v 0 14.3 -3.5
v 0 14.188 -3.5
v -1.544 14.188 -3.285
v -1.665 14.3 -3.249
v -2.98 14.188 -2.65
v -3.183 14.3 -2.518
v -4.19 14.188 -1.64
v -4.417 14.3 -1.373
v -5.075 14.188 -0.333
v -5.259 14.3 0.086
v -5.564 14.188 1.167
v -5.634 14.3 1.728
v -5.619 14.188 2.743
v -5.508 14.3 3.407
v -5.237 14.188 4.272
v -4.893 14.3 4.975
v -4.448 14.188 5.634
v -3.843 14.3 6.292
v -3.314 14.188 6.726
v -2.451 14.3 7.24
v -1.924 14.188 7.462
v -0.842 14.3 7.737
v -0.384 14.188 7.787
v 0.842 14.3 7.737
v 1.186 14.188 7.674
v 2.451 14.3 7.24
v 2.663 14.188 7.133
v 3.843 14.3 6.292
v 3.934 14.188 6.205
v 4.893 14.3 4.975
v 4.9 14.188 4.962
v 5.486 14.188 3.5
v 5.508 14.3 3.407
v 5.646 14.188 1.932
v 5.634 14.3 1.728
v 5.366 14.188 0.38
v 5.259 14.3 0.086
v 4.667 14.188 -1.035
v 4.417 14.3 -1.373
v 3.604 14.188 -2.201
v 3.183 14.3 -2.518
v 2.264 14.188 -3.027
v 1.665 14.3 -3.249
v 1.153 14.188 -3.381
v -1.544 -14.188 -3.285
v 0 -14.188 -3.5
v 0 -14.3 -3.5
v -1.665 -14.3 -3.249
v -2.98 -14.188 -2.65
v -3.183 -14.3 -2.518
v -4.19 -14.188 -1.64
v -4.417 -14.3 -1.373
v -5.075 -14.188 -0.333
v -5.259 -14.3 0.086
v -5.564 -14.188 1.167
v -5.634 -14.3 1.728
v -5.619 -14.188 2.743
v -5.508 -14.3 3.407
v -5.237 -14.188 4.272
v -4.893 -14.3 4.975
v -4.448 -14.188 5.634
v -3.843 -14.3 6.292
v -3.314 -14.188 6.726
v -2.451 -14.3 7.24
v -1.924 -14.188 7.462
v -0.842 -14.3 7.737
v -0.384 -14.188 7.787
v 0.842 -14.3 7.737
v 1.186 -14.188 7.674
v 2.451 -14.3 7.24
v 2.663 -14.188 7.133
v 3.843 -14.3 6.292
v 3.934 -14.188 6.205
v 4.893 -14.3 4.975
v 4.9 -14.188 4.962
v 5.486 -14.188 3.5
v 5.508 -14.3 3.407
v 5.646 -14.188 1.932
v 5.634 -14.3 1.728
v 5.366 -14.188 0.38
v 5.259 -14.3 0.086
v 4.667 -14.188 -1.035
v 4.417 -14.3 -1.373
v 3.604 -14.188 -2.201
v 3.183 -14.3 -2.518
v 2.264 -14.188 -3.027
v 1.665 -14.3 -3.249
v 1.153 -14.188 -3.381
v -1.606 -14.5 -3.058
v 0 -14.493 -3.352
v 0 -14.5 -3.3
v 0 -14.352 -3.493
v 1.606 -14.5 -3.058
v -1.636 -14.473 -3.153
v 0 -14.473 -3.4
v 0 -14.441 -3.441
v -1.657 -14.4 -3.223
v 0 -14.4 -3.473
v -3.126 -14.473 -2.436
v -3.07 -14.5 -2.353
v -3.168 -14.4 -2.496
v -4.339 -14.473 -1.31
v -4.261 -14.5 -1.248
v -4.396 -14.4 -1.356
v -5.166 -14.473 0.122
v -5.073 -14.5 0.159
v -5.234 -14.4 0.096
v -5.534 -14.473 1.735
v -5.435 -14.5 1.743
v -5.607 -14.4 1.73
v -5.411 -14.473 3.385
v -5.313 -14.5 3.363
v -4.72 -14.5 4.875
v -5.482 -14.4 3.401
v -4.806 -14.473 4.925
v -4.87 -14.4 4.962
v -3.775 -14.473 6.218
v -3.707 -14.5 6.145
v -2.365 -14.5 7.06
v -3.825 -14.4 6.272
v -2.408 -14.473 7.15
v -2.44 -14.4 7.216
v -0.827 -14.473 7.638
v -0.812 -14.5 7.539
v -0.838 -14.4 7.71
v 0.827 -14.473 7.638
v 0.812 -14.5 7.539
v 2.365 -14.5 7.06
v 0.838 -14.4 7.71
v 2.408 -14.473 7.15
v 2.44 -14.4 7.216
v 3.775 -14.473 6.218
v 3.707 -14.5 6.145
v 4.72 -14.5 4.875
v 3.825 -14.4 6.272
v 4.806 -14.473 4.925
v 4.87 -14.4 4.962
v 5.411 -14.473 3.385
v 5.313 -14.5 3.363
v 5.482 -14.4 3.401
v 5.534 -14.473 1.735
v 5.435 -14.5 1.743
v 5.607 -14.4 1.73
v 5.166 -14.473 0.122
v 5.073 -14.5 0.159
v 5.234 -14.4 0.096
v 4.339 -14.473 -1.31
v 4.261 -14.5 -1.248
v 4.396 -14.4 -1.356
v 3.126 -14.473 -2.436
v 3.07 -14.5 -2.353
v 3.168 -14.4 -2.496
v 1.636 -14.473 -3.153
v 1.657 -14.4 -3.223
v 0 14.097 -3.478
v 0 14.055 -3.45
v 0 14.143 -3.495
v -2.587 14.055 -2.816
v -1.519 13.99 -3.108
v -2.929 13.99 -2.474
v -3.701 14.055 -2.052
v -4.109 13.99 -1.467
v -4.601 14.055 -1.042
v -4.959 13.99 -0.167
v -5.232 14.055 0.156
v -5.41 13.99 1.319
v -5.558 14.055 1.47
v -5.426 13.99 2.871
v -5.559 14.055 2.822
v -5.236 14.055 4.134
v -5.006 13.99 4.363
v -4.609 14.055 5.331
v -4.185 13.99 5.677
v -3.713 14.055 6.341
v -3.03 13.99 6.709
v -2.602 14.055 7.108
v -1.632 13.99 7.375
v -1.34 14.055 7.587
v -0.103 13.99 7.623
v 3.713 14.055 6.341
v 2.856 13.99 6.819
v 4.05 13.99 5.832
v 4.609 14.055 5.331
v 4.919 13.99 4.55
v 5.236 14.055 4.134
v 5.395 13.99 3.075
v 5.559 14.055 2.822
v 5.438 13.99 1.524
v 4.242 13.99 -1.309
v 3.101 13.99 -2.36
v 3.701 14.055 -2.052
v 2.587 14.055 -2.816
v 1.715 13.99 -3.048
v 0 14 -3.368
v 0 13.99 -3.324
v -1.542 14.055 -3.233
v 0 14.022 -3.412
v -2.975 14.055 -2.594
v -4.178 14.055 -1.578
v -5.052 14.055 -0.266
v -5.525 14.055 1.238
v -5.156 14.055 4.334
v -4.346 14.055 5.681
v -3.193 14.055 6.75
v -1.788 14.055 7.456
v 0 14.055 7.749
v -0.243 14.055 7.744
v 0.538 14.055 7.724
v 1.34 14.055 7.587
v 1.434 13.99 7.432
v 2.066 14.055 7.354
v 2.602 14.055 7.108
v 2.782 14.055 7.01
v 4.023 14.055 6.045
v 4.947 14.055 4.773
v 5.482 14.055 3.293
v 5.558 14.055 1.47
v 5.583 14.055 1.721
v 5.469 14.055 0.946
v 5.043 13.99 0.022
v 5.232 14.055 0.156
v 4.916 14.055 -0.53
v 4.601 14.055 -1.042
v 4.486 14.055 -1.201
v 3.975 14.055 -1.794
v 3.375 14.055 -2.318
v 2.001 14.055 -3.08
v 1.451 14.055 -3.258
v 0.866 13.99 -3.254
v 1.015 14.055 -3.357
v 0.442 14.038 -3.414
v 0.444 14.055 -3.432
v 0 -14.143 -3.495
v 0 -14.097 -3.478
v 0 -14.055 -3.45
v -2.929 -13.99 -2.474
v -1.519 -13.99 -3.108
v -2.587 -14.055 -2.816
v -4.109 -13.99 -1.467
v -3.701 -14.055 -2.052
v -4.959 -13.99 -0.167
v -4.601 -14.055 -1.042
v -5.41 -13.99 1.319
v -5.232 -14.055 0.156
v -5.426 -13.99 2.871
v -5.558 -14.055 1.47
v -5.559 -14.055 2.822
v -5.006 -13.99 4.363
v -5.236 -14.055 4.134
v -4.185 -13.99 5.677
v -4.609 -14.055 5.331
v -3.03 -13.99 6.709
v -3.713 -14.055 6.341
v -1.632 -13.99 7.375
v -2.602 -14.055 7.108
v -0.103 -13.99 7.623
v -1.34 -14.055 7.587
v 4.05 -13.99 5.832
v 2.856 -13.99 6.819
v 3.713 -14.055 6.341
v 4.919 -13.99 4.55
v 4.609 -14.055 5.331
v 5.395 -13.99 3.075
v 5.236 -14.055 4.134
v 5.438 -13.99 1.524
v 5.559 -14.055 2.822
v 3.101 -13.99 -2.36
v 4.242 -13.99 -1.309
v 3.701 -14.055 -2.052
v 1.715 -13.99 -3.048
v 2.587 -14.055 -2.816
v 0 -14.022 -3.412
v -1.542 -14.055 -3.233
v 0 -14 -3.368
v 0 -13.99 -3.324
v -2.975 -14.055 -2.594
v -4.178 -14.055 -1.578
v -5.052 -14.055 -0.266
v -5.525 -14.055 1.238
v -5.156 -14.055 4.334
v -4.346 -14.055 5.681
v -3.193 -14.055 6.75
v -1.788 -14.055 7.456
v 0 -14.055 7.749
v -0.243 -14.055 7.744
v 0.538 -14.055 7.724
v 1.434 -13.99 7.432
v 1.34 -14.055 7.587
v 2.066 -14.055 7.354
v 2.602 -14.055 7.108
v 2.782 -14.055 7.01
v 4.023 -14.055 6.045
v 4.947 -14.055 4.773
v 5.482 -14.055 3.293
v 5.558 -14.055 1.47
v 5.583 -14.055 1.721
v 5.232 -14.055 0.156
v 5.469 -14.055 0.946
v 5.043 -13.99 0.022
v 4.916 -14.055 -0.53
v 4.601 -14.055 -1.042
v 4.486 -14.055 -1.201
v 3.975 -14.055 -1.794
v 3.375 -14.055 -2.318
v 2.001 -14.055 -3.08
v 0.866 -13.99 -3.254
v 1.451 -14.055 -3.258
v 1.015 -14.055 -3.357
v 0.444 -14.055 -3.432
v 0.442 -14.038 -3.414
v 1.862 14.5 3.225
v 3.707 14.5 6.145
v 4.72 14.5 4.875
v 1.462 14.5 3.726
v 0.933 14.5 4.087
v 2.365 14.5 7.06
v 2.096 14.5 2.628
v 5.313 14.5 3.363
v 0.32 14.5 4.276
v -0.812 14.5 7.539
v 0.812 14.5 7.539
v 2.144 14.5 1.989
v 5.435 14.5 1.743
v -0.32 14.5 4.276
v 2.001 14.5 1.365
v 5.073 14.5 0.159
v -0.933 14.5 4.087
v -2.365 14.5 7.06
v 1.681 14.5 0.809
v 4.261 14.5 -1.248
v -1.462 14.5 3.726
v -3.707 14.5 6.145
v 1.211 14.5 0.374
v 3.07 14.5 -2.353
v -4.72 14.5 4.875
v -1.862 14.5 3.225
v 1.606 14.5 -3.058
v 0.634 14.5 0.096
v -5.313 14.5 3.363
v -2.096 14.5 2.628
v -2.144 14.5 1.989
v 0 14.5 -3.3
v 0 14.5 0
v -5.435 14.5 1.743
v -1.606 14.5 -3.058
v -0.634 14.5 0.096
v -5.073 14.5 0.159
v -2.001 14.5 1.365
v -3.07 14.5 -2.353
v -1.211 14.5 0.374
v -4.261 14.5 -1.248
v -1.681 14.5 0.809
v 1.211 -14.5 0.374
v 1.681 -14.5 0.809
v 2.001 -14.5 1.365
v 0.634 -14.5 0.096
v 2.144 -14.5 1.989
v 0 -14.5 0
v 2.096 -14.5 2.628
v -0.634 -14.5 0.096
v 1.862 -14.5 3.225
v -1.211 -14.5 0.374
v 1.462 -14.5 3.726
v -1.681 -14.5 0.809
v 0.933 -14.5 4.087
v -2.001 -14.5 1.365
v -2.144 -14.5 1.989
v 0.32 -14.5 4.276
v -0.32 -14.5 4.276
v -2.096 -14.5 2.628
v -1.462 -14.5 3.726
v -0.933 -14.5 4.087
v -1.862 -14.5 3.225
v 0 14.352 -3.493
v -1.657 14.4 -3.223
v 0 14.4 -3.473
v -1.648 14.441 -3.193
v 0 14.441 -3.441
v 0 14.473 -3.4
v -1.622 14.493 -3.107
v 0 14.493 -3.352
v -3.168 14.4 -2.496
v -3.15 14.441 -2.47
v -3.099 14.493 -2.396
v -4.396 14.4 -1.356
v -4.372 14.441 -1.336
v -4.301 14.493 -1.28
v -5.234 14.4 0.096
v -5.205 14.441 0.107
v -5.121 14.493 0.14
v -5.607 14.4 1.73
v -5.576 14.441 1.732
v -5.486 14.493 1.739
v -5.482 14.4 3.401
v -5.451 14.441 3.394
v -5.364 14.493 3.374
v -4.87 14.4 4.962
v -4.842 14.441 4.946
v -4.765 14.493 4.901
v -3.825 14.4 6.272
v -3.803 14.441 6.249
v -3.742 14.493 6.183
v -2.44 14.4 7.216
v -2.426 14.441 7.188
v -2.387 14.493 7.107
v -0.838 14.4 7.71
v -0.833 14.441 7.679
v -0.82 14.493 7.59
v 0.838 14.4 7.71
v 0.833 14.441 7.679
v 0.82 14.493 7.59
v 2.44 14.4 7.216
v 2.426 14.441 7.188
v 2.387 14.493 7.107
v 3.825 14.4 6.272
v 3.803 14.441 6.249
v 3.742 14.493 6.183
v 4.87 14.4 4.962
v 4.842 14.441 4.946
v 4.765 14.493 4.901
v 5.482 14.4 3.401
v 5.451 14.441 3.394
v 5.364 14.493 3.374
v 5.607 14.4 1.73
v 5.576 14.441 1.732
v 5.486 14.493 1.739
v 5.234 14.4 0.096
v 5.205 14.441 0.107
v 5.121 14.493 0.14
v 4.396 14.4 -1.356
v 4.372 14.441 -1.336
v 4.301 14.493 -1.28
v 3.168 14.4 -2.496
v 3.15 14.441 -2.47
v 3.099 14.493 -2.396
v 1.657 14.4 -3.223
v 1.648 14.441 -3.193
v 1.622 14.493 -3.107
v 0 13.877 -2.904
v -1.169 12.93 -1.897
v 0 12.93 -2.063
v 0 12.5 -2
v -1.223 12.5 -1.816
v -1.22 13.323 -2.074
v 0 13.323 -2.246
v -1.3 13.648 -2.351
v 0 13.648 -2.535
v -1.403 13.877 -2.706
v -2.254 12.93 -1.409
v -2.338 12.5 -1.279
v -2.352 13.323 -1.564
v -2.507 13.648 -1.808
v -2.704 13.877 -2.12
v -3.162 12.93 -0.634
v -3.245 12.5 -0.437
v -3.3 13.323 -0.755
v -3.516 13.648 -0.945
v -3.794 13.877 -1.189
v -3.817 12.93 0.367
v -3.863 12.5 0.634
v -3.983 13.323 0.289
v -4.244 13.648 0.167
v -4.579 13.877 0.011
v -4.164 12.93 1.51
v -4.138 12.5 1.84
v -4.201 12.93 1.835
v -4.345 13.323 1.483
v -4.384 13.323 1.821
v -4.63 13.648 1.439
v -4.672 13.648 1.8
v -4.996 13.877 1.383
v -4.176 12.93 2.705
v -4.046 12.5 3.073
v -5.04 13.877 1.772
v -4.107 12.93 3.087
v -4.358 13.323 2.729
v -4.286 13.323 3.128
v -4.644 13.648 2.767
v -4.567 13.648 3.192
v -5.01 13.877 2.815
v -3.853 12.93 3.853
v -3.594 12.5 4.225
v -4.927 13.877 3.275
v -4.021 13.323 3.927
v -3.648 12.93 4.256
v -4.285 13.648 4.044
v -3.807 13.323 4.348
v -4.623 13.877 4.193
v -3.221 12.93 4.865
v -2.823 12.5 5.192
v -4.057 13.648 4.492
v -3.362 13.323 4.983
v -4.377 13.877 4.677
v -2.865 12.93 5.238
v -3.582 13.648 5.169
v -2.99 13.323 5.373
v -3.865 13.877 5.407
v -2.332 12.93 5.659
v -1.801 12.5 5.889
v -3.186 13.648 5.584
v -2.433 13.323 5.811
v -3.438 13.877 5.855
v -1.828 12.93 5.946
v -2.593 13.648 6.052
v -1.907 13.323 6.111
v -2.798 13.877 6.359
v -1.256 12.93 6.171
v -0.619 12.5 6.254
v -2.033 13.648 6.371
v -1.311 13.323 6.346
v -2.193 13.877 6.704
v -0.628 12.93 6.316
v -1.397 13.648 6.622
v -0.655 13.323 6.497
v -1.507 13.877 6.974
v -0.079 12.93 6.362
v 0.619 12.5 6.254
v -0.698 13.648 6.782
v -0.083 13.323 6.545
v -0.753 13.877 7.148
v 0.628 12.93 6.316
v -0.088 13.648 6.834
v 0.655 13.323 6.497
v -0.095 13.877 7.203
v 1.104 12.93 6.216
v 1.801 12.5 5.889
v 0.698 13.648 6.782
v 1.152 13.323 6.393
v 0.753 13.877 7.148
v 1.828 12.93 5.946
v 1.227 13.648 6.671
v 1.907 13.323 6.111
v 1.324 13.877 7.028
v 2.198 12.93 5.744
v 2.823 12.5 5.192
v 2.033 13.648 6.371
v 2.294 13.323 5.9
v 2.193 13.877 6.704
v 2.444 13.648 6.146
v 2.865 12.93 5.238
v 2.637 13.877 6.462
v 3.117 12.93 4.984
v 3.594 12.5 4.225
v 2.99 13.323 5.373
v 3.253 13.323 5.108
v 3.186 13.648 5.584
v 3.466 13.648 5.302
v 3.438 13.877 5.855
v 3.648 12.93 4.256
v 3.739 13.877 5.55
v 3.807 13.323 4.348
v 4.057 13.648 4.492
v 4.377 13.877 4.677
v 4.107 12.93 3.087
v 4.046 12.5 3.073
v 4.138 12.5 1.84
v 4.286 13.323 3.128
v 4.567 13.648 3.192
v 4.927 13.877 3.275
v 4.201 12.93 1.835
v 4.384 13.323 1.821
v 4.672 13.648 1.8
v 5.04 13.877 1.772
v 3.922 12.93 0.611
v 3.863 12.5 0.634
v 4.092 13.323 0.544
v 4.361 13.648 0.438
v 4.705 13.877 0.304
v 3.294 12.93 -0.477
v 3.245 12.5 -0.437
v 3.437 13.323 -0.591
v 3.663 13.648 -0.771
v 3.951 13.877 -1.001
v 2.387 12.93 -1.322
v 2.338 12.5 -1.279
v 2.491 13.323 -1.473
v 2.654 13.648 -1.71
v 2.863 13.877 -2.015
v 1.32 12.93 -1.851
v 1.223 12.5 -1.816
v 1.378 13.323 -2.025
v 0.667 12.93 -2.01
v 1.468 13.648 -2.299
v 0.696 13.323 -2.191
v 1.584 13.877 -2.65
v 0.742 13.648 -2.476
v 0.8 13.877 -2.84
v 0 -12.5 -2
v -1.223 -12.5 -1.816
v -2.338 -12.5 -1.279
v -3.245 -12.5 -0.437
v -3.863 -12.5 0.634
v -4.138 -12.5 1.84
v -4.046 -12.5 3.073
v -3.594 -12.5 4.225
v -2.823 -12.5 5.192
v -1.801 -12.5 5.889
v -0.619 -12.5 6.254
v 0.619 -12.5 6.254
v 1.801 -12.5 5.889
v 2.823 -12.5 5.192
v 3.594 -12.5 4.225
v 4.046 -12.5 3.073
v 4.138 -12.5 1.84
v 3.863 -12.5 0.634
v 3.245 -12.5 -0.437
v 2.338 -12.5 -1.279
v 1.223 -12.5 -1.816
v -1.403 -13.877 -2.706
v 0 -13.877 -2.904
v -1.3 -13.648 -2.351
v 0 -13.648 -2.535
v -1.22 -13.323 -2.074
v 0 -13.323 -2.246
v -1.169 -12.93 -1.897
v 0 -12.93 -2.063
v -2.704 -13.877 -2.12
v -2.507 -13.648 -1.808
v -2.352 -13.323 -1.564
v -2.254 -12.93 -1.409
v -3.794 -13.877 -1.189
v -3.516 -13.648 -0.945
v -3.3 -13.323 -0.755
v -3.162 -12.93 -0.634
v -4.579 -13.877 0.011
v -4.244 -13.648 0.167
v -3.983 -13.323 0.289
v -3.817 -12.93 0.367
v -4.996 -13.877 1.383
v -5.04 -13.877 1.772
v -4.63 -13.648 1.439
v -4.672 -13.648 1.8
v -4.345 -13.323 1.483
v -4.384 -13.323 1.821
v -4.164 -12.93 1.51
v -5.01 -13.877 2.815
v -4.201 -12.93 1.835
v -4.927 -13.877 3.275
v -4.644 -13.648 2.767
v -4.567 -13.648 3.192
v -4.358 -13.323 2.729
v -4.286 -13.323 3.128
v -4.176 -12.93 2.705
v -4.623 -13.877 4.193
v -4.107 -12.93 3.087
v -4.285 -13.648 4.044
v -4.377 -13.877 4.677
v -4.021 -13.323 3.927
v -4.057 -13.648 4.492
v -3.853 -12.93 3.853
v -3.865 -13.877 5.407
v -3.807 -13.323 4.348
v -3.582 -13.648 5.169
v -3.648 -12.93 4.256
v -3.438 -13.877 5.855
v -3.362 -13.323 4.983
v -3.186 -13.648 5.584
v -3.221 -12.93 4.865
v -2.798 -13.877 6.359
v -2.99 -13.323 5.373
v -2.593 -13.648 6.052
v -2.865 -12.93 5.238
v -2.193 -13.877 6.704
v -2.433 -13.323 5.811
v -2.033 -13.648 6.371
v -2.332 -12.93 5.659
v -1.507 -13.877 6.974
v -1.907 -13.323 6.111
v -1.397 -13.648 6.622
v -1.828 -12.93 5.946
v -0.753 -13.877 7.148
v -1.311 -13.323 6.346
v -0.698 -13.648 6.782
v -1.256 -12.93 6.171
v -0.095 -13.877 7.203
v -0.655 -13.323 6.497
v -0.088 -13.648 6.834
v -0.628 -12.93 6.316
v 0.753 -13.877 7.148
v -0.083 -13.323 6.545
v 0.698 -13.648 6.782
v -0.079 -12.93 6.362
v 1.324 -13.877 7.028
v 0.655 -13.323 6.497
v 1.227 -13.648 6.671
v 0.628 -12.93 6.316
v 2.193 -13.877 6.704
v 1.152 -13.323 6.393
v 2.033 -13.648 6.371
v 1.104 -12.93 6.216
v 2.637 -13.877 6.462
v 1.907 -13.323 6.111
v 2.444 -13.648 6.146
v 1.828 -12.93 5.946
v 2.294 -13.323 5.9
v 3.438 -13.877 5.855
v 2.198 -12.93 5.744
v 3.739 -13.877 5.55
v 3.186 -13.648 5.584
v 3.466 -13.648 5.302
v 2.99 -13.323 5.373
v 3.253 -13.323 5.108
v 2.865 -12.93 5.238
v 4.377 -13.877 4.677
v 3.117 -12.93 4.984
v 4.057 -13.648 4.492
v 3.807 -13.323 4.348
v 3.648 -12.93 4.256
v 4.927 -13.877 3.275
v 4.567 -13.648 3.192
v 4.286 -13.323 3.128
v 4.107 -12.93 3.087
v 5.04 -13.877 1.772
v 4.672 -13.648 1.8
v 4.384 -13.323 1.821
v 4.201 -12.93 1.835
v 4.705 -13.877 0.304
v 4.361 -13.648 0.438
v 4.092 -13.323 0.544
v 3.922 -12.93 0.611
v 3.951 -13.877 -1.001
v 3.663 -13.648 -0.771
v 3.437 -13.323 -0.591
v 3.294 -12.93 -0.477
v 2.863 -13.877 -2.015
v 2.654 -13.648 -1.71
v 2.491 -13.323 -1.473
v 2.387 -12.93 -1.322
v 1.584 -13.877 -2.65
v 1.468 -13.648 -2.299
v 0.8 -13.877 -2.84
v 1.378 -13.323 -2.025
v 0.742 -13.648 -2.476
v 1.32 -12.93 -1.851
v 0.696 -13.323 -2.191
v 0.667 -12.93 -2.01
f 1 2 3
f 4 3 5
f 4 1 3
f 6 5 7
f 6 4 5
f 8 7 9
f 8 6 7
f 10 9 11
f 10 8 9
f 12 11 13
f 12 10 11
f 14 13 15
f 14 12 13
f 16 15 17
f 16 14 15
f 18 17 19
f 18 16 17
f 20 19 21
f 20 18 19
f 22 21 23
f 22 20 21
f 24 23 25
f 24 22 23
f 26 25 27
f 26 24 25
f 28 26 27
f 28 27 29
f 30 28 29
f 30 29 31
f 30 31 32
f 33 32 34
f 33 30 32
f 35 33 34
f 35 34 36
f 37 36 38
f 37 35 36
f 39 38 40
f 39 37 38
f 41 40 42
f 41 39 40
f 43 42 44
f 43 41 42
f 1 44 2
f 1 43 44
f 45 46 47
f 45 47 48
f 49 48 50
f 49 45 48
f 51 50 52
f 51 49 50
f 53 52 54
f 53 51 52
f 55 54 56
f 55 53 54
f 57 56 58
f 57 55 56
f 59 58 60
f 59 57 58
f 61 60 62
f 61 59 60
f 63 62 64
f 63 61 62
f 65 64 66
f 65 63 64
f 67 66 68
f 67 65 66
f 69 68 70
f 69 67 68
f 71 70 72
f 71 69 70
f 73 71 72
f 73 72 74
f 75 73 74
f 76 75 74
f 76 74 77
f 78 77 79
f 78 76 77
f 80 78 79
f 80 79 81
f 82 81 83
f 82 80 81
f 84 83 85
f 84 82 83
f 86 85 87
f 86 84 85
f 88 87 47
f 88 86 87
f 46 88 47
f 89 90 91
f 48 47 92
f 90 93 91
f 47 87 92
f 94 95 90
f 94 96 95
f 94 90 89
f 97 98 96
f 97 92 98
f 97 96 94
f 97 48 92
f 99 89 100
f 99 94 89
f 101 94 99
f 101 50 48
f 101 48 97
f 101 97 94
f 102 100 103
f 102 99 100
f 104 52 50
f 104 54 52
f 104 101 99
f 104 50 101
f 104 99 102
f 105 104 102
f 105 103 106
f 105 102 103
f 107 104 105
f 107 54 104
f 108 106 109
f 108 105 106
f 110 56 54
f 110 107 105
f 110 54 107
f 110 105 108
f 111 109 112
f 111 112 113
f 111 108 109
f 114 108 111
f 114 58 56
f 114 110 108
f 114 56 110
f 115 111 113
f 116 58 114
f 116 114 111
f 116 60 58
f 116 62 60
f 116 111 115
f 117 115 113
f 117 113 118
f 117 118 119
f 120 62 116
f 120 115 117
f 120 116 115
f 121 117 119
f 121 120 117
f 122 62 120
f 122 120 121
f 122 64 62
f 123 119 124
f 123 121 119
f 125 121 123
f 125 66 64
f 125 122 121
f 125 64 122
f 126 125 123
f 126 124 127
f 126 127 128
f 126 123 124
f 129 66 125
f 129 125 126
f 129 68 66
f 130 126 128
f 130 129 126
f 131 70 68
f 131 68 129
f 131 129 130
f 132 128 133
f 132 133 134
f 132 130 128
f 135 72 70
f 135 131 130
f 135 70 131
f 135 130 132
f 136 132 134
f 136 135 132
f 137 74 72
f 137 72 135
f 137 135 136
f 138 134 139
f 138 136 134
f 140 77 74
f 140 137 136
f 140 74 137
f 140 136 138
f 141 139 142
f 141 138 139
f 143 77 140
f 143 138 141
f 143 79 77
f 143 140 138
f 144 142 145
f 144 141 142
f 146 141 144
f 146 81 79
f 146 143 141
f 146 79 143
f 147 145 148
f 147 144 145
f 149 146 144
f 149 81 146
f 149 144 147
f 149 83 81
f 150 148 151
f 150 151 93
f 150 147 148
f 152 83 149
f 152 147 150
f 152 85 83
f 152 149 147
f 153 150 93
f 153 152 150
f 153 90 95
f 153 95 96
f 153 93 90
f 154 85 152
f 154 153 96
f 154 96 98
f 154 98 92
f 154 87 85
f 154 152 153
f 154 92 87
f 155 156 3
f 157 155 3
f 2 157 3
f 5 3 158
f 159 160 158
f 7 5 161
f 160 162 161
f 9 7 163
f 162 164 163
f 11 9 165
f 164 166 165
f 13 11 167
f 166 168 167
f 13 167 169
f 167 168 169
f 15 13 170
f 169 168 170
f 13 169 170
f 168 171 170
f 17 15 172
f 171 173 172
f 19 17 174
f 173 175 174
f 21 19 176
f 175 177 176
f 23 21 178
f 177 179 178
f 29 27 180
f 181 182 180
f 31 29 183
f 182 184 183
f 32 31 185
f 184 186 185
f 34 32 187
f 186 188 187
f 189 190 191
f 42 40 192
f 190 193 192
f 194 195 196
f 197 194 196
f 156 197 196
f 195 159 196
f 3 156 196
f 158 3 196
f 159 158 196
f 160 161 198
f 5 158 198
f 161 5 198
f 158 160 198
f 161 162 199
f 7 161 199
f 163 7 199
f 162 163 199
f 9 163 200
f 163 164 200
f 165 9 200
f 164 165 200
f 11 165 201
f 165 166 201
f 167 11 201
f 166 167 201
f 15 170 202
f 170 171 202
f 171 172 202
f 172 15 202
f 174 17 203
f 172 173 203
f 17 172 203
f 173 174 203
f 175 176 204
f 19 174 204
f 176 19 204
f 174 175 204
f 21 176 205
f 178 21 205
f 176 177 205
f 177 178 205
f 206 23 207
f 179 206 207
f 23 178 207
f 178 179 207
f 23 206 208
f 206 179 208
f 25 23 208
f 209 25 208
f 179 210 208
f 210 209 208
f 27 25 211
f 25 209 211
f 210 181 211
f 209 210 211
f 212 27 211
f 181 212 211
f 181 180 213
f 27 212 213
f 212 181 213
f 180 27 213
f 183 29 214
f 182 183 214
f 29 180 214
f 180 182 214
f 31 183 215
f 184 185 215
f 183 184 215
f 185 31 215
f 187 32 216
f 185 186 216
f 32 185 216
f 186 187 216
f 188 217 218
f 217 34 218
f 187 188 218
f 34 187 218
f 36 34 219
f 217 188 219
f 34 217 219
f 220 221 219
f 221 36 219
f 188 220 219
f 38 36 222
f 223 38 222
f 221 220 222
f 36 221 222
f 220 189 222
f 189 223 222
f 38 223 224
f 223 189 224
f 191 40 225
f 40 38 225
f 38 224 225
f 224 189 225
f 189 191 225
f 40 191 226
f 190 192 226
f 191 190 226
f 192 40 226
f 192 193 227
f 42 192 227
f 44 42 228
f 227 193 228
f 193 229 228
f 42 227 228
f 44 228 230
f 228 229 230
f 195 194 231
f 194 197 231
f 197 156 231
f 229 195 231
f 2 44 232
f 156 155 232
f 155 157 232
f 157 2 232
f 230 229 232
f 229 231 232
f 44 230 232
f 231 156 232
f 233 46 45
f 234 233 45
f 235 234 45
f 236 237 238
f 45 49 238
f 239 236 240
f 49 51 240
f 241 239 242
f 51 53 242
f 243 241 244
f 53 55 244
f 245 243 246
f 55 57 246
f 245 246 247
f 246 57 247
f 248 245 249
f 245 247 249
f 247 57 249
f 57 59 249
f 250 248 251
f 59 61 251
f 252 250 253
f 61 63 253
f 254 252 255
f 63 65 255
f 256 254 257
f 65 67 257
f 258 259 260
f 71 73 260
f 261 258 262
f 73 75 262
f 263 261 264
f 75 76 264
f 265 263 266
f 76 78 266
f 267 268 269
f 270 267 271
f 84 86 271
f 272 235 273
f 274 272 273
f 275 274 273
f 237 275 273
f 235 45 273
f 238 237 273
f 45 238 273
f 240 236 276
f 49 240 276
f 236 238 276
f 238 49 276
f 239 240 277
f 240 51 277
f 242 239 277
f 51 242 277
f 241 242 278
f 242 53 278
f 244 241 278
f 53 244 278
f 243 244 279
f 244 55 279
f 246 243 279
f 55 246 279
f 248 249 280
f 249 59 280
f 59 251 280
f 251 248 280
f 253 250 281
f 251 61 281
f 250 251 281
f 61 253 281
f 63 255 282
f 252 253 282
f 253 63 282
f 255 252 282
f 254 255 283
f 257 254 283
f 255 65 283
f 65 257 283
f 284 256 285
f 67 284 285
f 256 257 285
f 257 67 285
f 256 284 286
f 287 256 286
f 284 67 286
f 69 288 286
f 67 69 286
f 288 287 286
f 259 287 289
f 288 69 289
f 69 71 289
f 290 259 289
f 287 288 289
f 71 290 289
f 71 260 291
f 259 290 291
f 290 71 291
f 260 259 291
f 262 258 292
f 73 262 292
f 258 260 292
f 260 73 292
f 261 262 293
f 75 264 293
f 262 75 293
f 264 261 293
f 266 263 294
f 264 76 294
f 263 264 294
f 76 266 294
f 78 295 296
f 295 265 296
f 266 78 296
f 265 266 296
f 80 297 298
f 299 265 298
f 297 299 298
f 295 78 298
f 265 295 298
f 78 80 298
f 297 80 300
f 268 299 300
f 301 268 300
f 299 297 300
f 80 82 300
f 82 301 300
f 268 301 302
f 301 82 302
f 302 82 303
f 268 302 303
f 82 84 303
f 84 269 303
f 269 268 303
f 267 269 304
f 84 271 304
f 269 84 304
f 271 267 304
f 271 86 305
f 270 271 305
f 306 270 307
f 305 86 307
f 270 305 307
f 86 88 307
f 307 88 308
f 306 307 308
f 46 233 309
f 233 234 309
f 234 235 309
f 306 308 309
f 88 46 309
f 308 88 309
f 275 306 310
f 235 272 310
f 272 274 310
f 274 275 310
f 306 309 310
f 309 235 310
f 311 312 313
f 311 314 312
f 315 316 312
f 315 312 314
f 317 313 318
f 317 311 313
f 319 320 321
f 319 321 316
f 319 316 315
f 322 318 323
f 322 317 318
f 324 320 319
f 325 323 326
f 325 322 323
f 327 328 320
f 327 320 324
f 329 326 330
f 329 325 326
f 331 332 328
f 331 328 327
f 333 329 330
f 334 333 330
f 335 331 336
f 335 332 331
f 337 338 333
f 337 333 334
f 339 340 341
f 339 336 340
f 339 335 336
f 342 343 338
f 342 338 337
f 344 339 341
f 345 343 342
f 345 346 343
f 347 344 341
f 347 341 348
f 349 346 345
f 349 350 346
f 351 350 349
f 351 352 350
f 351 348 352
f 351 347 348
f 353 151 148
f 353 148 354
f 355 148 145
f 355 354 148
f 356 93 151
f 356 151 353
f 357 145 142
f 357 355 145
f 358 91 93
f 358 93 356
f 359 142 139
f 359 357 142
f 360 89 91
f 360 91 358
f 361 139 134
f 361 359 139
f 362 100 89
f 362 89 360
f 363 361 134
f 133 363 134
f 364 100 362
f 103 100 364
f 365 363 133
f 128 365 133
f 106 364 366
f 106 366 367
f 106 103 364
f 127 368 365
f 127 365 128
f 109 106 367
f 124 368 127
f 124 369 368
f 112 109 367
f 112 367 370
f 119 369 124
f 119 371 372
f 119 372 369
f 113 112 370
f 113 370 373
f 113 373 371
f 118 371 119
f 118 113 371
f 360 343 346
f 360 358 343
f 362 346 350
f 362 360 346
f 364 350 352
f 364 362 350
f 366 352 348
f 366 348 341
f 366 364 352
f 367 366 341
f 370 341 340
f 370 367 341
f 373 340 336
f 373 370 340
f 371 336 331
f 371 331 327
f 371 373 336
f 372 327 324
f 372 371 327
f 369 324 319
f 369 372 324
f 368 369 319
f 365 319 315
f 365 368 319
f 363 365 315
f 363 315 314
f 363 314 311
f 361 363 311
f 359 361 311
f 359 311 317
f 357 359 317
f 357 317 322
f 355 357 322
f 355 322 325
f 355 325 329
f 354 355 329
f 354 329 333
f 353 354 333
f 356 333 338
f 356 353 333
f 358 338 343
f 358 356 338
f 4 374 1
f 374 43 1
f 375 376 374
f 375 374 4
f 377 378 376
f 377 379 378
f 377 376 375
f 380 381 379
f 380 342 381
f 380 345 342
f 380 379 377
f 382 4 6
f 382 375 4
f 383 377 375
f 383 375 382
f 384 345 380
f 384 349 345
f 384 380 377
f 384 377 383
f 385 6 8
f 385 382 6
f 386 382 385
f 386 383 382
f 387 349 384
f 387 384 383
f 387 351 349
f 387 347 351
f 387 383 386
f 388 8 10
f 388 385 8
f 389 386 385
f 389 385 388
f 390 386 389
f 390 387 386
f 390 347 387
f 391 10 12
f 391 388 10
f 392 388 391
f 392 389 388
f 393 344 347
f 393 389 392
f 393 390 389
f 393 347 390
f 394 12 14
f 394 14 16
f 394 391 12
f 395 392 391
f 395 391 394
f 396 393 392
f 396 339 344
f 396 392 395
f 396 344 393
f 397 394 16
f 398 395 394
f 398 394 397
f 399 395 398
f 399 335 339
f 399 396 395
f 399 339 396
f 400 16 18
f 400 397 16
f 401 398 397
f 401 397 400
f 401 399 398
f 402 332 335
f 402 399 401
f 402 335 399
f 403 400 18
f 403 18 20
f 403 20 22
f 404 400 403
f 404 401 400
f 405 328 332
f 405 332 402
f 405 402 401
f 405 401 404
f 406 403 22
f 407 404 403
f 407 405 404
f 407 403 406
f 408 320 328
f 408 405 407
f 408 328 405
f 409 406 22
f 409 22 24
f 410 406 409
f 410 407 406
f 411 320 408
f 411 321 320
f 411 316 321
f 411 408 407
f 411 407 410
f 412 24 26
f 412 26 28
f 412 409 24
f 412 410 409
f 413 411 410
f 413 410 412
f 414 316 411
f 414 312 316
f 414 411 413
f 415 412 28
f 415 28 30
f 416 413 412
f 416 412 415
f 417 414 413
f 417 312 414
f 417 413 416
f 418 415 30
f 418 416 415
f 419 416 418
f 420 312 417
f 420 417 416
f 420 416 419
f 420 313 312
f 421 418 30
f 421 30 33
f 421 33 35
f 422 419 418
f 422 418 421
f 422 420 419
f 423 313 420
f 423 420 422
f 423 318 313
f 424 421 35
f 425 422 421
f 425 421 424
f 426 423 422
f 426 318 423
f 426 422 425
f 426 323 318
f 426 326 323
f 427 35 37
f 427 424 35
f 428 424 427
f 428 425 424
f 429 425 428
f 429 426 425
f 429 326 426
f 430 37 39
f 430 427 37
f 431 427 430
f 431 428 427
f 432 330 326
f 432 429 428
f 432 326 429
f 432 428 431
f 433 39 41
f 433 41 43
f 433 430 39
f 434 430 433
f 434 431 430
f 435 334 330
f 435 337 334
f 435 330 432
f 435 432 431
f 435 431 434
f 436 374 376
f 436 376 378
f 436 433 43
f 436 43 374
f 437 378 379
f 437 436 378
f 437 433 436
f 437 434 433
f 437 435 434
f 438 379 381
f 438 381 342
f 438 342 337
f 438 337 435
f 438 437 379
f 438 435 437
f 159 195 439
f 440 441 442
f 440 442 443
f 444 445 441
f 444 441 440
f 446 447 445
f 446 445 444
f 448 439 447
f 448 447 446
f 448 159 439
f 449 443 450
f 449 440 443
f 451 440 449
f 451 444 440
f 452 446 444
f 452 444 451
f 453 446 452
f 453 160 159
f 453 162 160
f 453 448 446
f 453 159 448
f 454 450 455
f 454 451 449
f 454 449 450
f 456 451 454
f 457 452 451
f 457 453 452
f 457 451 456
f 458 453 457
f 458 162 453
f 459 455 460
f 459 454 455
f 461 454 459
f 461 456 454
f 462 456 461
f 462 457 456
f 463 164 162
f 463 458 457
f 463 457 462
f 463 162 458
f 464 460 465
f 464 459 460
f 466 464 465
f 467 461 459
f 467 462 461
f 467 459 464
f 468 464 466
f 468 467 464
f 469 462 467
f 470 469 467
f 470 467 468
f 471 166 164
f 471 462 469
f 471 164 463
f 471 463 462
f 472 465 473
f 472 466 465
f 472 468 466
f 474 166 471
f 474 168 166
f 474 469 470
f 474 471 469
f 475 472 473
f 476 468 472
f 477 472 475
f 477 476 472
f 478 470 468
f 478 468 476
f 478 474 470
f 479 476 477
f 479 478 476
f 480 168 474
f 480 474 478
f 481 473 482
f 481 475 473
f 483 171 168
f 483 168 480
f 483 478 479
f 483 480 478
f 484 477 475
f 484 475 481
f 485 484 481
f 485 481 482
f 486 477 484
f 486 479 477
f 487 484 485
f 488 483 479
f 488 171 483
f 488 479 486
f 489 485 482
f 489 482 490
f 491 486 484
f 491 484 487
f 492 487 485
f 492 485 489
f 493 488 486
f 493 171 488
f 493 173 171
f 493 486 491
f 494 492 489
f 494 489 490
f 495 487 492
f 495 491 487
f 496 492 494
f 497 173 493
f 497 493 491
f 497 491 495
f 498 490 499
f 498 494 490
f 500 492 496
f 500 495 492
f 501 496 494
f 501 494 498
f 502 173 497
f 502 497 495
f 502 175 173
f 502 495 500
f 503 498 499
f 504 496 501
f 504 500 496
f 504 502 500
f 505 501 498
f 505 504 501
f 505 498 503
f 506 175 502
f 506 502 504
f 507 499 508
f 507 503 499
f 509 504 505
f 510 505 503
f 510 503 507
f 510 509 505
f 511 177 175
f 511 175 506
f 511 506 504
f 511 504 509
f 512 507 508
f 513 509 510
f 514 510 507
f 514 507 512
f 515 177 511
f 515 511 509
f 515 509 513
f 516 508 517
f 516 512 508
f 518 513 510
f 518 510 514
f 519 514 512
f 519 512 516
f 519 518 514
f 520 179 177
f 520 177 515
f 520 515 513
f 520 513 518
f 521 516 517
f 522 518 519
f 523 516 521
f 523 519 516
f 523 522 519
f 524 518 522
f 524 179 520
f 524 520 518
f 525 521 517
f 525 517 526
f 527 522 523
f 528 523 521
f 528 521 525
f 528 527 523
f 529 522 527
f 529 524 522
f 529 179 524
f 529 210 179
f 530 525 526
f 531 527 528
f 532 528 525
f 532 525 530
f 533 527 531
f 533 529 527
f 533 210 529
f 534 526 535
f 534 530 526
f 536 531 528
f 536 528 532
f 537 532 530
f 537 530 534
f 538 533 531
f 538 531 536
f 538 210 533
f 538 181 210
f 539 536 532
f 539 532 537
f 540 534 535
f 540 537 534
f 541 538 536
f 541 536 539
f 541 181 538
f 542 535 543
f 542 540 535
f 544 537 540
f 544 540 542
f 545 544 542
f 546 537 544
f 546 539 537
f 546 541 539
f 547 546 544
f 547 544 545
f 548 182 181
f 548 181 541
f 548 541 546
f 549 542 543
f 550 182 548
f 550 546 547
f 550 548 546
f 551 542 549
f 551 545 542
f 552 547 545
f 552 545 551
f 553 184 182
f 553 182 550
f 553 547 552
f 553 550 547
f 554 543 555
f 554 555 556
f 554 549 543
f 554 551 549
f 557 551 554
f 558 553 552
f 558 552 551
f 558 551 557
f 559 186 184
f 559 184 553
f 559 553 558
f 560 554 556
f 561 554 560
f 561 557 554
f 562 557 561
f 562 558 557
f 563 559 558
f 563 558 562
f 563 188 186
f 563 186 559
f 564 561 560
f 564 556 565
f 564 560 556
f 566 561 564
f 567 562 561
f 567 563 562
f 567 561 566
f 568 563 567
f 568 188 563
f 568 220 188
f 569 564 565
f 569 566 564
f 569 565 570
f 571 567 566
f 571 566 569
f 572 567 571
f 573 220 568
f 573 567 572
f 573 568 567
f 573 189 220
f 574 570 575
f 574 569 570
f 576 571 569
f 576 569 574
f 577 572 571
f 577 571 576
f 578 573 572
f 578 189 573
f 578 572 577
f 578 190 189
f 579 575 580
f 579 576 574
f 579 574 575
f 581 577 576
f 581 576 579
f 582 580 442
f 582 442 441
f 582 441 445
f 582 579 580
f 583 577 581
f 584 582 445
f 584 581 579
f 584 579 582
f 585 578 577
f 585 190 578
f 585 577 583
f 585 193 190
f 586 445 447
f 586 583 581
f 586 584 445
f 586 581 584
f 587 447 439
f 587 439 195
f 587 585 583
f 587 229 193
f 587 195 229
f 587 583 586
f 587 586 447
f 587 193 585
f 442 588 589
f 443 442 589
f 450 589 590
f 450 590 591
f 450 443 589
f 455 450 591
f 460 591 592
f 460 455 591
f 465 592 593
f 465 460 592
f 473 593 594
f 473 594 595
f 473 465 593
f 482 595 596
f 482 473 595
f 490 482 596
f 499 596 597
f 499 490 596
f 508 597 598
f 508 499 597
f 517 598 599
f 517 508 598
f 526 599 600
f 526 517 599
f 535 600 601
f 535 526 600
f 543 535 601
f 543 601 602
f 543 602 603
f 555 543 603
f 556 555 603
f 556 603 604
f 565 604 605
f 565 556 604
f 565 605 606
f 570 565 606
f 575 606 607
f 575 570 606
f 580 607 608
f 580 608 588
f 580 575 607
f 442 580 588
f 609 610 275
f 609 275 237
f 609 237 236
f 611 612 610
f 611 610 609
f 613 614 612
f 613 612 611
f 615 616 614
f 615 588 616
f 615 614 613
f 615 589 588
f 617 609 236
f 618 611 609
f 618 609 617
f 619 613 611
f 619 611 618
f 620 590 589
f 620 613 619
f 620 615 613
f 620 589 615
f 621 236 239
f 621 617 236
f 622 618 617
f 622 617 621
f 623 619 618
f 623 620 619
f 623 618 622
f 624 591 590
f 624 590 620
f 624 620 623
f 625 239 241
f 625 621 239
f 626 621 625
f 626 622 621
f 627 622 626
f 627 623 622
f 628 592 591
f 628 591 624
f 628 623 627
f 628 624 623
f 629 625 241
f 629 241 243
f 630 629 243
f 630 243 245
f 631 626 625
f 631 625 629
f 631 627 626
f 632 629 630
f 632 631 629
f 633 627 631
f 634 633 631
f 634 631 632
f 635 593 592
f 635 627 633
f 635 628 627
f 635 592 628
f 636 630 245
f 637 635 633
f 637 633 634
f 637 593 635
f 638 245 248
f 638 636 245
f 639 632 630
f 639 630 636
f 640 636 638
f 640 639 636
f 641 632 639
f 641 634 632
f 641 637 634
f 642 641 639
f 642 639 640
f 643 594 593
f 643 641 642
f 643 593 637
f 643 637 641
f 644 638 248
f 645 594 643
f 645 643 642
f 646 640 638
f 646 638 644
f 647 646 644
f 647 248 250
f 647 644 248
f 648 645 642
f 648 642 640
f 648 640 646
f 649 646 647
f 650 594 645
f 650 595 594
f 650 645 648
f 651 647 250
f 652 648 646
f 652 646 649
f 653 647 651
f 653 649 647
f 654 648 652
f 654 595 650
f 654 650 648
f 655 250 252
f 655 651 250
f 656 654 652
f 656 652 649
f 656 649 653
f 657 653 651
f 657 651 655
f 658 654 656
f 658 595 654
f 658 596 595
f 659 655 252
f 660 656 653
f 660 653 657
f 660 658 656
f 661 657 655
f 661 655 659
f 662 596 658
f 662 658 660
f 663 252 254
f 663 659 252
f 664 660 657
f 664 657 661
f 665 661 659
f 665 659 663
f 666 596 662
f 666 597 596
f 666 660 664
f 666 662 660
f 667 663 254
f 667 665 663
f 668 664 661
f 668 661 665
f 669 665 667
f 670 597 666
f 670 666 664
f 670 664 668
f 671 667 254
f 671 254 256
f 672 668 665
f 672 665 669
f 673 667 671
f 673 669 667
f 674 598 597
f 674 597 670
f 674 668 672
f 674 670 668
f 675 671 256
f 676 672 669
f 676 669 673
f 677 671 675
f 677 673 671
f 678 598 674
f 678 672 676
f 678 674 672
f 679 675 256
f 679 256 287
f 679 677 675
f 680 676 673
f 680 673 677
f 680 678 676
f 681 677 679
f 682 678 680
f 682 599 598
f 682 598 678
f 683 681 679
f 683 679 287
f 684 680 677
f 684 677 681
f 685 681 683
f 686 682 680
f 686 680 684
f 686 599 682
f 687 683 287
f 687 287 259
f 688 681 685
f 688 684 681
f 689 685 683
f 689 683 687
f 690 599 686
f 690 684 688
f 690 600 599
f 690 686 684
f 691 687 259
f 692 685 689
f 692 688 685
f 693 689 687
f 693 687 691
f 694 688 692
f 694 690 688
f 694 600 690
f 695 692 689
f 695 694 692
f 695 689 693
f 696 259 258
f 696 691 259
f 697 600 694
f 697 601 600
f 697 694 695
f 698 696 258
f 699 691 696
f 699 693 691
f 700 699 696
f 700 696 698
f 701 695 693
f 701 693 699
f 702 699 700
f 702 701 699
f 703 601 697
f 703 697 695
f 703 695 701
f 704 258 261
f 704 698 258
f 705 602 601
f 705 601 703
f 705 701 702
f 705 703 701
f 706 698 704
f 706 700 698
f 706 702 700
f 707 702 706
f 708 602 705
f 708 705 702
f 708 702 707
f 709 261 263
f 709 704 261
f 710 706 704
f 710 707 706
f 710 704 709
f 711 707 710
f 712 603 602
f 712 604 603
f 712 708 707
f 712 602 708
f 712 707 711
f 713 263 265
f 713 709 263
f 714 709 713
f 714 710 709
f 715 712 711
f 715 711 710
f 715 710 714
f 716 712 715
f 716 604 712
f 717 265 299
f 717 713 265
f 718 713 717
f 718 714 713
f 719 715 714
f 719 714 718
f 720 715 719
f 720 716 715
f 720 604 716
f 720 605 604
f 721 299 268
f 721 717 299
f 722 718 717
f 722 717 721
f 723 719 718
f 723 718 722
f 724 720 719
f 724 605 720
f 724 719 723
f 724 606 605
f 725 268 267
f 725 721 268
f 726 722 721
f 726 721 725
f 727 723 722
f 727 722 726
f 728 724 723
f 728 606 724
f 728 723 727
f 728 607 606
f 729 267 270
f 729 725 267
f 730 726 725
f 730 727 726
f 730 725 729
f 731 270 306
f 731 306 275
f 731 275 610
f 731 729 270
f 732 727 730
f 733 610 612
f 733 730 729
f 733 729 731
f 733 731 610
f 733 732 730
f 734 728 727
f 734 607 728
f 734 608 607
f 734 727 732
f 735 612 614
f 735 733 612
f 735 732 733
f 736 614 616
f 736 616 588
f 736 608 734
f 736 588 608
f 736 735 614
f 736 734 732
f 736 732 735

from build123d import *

# Parameters (mm, degrees)
FILLET2_R = 0.2


with BuildPart() as part:
    # Sketch4 → Revolve2 (revolve)
    with BuildSketch(Plane(origin=(0, 0, 0), x_dir=(0, 0, -1), z_dir=(1, 0, 0))):
        with BuildLine():
            Line((2, -12.5), (2, 12.5))
            ThreePointArc((2, 12.5), (2.439339828, 13.560660172), (3.5, 14))
            Line((3.5, 14), (3.5, 14.5))
            Line((3.5, 14.5), (0, 14.5))
            Line((0, 14.5), (0, 14))
            Line((0, 14), (0, -14))
            Line((0, -14), (0, -14.5))
            Line((0, -14.5), (3.5, -14.5))
            Line((3.5, -14.5), (3.5, -14))
            ThreePointArc((3.5, -14), (2.439339828, -13.560660172), (2, -12.5))
        make_face()
    revolve(axis=Axis((0, 0, 2.15), (0, 1, 0)))

    # Fillet2
    fillet2_edges = [part.edges().sort_by_distance(p)[0] for p in [
        (0, -14.5, 7.8),
        (0, -14, 7.8),
        (0, 14, 7.8),
        (0, 14.5, 7.8),
    ]]
    fillet(fillet2_edges, radius=FILLET2_R)


solid = part.part
